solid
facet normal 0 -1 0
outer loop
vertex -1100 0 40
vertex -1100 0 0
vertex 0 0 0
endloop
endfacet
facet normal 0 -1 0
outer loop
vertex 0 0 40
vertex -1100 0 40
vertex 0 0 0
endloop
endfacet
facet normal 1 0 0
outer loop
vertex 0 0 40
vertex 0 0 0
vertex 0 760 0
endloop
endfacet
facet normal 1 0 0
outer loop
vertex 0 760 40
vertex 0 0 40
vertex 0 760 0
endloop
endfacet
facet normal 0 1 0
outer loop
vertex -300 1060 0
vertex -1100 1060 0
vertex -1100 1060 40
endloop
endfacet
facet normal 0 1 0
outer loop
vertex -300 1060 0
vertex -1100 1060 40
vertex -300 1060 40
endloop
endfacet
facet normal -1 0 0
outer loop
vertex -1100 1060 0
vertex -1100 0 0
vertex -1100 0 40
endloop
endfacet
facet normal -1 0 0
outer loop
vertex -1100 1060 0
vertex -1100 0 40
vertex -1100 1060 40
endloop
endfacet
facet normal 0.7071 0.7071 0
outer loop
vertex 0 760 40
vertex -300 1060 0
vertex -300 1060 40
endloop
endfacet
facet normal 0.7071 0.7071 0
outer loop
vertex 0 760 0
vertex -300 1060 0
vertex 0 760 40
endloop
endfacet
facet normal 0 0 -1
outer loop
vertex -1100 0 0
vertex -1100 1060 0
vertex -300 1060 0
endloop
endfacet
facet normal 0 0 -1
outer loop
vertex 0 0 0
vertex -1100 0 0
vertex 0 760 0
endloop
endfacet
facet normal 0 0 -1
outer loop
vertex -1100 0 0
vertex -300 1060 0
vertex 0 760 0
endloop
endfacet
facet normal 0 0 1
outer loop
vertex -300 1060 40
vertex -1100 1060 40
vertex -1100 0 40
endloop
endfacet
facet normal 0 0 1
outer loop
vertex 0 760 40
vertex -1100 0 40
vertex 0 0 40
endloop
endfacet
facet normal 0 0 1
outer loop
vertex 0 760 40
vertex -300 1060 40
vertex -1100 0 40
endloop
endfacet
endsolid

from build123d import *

# Parameters (mm, degrees)
SKETCH1_W               = 1100
SKETCH1_H               = 1060
BOSS_EXTRUDE1_DEPTH     = 40
CUT_EXTRUDE1_DEPTH      = 1529.136119591
CUT_EXTRUDE1_DEPTH_BACK = 40


with BuildPart() as part:
    # Sketch1 → Boss-Extrude1 (new body)
    with BuildSketch(Plane.XY):
        with Locations((-550, 530)):
            Rectangle(SKETCH1_W, SKETCH1_H)
    extrude(amount=BOSS_EXTRUDE1_DEPTH)

    # Sketch2 → Cut-Extrude1 (cut, two sides: drawn at the far end of the back side and taken through both)
    with BuildSketch(Plane.XY.offset(40).offset(-CUT_EXTRUDE1_DEPTH_BACK)):
        Polygon((-2197.89099578, 2957.89099578), (-300, 1060), (0, 760), (1897.89099578, -1137.89099578), (5693.672987339, 2657.89099578), (1597.89099578, 6753.672987339), align=None)
    extrude(amount=CUT_EXTRUDE1_DEPTH + CUT_EXTRUDE1_DEPTH_BACK, mode=Mode.SUBTRACT)


solid = part.part
